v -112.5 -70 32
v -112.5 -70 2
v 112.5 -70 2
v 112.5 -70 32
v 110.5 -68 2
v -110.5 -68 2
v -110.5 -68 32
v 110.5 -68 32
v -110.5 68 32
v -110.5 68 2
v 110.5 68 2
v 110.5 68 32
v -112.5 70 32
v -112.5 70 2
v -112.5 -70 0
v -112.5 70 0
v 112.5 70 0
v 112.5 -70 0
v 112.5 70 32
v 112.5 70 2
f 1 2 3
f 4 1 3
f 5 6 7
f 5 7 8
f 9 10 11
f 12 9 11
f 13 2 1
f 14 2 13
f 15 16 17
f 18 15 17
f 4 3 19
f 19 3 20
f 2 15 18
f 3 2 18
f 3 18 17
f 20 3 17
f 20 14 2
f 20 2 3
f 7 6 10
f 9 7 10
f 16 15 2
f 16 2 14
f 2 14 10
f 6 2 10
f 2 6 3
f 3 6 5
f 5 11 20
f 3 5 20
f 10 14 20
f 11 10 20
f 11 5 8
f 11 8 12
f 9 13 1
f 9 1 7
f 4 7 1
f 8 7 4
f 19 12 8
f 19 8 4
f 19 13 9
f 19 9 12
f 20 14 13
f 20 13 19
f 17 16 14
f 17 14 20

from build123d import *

# Parameters (mm, degrees)
SKETCH_W      = 225
SKETCH_H      = 140
PAD_DEPTH     = 2
SKETCH001_W   = 225
SKETCH001_H   = 140
SKETCH001_W_2 = 221
SKETCH001_H_2 = 136
PAD001_DEPTH  = 30


with BuildPart() as pad:
    # Sketch → Pad (new body)
    with BuildSketch(Plane.XY):
        Rectangle(SKETCH_W, SKETCH_H)
    extrude(amount=PAD_DEPTH)


with BuildPart() as pad001:
    # Sketch001 → Pad001 (new body)
    with BuildSketch(Plane.XY.offset(2)):
        Rectangle(SKETCH001_W, SKETCH001_H)
        Rectangle(SKETCH001_W_2, SKETCH001_H_2, mode=Mode.SUBTRACT)
    extrude(amount=PAD001_DEPTH)


solid = Compound([pad.part, pad001.part])
